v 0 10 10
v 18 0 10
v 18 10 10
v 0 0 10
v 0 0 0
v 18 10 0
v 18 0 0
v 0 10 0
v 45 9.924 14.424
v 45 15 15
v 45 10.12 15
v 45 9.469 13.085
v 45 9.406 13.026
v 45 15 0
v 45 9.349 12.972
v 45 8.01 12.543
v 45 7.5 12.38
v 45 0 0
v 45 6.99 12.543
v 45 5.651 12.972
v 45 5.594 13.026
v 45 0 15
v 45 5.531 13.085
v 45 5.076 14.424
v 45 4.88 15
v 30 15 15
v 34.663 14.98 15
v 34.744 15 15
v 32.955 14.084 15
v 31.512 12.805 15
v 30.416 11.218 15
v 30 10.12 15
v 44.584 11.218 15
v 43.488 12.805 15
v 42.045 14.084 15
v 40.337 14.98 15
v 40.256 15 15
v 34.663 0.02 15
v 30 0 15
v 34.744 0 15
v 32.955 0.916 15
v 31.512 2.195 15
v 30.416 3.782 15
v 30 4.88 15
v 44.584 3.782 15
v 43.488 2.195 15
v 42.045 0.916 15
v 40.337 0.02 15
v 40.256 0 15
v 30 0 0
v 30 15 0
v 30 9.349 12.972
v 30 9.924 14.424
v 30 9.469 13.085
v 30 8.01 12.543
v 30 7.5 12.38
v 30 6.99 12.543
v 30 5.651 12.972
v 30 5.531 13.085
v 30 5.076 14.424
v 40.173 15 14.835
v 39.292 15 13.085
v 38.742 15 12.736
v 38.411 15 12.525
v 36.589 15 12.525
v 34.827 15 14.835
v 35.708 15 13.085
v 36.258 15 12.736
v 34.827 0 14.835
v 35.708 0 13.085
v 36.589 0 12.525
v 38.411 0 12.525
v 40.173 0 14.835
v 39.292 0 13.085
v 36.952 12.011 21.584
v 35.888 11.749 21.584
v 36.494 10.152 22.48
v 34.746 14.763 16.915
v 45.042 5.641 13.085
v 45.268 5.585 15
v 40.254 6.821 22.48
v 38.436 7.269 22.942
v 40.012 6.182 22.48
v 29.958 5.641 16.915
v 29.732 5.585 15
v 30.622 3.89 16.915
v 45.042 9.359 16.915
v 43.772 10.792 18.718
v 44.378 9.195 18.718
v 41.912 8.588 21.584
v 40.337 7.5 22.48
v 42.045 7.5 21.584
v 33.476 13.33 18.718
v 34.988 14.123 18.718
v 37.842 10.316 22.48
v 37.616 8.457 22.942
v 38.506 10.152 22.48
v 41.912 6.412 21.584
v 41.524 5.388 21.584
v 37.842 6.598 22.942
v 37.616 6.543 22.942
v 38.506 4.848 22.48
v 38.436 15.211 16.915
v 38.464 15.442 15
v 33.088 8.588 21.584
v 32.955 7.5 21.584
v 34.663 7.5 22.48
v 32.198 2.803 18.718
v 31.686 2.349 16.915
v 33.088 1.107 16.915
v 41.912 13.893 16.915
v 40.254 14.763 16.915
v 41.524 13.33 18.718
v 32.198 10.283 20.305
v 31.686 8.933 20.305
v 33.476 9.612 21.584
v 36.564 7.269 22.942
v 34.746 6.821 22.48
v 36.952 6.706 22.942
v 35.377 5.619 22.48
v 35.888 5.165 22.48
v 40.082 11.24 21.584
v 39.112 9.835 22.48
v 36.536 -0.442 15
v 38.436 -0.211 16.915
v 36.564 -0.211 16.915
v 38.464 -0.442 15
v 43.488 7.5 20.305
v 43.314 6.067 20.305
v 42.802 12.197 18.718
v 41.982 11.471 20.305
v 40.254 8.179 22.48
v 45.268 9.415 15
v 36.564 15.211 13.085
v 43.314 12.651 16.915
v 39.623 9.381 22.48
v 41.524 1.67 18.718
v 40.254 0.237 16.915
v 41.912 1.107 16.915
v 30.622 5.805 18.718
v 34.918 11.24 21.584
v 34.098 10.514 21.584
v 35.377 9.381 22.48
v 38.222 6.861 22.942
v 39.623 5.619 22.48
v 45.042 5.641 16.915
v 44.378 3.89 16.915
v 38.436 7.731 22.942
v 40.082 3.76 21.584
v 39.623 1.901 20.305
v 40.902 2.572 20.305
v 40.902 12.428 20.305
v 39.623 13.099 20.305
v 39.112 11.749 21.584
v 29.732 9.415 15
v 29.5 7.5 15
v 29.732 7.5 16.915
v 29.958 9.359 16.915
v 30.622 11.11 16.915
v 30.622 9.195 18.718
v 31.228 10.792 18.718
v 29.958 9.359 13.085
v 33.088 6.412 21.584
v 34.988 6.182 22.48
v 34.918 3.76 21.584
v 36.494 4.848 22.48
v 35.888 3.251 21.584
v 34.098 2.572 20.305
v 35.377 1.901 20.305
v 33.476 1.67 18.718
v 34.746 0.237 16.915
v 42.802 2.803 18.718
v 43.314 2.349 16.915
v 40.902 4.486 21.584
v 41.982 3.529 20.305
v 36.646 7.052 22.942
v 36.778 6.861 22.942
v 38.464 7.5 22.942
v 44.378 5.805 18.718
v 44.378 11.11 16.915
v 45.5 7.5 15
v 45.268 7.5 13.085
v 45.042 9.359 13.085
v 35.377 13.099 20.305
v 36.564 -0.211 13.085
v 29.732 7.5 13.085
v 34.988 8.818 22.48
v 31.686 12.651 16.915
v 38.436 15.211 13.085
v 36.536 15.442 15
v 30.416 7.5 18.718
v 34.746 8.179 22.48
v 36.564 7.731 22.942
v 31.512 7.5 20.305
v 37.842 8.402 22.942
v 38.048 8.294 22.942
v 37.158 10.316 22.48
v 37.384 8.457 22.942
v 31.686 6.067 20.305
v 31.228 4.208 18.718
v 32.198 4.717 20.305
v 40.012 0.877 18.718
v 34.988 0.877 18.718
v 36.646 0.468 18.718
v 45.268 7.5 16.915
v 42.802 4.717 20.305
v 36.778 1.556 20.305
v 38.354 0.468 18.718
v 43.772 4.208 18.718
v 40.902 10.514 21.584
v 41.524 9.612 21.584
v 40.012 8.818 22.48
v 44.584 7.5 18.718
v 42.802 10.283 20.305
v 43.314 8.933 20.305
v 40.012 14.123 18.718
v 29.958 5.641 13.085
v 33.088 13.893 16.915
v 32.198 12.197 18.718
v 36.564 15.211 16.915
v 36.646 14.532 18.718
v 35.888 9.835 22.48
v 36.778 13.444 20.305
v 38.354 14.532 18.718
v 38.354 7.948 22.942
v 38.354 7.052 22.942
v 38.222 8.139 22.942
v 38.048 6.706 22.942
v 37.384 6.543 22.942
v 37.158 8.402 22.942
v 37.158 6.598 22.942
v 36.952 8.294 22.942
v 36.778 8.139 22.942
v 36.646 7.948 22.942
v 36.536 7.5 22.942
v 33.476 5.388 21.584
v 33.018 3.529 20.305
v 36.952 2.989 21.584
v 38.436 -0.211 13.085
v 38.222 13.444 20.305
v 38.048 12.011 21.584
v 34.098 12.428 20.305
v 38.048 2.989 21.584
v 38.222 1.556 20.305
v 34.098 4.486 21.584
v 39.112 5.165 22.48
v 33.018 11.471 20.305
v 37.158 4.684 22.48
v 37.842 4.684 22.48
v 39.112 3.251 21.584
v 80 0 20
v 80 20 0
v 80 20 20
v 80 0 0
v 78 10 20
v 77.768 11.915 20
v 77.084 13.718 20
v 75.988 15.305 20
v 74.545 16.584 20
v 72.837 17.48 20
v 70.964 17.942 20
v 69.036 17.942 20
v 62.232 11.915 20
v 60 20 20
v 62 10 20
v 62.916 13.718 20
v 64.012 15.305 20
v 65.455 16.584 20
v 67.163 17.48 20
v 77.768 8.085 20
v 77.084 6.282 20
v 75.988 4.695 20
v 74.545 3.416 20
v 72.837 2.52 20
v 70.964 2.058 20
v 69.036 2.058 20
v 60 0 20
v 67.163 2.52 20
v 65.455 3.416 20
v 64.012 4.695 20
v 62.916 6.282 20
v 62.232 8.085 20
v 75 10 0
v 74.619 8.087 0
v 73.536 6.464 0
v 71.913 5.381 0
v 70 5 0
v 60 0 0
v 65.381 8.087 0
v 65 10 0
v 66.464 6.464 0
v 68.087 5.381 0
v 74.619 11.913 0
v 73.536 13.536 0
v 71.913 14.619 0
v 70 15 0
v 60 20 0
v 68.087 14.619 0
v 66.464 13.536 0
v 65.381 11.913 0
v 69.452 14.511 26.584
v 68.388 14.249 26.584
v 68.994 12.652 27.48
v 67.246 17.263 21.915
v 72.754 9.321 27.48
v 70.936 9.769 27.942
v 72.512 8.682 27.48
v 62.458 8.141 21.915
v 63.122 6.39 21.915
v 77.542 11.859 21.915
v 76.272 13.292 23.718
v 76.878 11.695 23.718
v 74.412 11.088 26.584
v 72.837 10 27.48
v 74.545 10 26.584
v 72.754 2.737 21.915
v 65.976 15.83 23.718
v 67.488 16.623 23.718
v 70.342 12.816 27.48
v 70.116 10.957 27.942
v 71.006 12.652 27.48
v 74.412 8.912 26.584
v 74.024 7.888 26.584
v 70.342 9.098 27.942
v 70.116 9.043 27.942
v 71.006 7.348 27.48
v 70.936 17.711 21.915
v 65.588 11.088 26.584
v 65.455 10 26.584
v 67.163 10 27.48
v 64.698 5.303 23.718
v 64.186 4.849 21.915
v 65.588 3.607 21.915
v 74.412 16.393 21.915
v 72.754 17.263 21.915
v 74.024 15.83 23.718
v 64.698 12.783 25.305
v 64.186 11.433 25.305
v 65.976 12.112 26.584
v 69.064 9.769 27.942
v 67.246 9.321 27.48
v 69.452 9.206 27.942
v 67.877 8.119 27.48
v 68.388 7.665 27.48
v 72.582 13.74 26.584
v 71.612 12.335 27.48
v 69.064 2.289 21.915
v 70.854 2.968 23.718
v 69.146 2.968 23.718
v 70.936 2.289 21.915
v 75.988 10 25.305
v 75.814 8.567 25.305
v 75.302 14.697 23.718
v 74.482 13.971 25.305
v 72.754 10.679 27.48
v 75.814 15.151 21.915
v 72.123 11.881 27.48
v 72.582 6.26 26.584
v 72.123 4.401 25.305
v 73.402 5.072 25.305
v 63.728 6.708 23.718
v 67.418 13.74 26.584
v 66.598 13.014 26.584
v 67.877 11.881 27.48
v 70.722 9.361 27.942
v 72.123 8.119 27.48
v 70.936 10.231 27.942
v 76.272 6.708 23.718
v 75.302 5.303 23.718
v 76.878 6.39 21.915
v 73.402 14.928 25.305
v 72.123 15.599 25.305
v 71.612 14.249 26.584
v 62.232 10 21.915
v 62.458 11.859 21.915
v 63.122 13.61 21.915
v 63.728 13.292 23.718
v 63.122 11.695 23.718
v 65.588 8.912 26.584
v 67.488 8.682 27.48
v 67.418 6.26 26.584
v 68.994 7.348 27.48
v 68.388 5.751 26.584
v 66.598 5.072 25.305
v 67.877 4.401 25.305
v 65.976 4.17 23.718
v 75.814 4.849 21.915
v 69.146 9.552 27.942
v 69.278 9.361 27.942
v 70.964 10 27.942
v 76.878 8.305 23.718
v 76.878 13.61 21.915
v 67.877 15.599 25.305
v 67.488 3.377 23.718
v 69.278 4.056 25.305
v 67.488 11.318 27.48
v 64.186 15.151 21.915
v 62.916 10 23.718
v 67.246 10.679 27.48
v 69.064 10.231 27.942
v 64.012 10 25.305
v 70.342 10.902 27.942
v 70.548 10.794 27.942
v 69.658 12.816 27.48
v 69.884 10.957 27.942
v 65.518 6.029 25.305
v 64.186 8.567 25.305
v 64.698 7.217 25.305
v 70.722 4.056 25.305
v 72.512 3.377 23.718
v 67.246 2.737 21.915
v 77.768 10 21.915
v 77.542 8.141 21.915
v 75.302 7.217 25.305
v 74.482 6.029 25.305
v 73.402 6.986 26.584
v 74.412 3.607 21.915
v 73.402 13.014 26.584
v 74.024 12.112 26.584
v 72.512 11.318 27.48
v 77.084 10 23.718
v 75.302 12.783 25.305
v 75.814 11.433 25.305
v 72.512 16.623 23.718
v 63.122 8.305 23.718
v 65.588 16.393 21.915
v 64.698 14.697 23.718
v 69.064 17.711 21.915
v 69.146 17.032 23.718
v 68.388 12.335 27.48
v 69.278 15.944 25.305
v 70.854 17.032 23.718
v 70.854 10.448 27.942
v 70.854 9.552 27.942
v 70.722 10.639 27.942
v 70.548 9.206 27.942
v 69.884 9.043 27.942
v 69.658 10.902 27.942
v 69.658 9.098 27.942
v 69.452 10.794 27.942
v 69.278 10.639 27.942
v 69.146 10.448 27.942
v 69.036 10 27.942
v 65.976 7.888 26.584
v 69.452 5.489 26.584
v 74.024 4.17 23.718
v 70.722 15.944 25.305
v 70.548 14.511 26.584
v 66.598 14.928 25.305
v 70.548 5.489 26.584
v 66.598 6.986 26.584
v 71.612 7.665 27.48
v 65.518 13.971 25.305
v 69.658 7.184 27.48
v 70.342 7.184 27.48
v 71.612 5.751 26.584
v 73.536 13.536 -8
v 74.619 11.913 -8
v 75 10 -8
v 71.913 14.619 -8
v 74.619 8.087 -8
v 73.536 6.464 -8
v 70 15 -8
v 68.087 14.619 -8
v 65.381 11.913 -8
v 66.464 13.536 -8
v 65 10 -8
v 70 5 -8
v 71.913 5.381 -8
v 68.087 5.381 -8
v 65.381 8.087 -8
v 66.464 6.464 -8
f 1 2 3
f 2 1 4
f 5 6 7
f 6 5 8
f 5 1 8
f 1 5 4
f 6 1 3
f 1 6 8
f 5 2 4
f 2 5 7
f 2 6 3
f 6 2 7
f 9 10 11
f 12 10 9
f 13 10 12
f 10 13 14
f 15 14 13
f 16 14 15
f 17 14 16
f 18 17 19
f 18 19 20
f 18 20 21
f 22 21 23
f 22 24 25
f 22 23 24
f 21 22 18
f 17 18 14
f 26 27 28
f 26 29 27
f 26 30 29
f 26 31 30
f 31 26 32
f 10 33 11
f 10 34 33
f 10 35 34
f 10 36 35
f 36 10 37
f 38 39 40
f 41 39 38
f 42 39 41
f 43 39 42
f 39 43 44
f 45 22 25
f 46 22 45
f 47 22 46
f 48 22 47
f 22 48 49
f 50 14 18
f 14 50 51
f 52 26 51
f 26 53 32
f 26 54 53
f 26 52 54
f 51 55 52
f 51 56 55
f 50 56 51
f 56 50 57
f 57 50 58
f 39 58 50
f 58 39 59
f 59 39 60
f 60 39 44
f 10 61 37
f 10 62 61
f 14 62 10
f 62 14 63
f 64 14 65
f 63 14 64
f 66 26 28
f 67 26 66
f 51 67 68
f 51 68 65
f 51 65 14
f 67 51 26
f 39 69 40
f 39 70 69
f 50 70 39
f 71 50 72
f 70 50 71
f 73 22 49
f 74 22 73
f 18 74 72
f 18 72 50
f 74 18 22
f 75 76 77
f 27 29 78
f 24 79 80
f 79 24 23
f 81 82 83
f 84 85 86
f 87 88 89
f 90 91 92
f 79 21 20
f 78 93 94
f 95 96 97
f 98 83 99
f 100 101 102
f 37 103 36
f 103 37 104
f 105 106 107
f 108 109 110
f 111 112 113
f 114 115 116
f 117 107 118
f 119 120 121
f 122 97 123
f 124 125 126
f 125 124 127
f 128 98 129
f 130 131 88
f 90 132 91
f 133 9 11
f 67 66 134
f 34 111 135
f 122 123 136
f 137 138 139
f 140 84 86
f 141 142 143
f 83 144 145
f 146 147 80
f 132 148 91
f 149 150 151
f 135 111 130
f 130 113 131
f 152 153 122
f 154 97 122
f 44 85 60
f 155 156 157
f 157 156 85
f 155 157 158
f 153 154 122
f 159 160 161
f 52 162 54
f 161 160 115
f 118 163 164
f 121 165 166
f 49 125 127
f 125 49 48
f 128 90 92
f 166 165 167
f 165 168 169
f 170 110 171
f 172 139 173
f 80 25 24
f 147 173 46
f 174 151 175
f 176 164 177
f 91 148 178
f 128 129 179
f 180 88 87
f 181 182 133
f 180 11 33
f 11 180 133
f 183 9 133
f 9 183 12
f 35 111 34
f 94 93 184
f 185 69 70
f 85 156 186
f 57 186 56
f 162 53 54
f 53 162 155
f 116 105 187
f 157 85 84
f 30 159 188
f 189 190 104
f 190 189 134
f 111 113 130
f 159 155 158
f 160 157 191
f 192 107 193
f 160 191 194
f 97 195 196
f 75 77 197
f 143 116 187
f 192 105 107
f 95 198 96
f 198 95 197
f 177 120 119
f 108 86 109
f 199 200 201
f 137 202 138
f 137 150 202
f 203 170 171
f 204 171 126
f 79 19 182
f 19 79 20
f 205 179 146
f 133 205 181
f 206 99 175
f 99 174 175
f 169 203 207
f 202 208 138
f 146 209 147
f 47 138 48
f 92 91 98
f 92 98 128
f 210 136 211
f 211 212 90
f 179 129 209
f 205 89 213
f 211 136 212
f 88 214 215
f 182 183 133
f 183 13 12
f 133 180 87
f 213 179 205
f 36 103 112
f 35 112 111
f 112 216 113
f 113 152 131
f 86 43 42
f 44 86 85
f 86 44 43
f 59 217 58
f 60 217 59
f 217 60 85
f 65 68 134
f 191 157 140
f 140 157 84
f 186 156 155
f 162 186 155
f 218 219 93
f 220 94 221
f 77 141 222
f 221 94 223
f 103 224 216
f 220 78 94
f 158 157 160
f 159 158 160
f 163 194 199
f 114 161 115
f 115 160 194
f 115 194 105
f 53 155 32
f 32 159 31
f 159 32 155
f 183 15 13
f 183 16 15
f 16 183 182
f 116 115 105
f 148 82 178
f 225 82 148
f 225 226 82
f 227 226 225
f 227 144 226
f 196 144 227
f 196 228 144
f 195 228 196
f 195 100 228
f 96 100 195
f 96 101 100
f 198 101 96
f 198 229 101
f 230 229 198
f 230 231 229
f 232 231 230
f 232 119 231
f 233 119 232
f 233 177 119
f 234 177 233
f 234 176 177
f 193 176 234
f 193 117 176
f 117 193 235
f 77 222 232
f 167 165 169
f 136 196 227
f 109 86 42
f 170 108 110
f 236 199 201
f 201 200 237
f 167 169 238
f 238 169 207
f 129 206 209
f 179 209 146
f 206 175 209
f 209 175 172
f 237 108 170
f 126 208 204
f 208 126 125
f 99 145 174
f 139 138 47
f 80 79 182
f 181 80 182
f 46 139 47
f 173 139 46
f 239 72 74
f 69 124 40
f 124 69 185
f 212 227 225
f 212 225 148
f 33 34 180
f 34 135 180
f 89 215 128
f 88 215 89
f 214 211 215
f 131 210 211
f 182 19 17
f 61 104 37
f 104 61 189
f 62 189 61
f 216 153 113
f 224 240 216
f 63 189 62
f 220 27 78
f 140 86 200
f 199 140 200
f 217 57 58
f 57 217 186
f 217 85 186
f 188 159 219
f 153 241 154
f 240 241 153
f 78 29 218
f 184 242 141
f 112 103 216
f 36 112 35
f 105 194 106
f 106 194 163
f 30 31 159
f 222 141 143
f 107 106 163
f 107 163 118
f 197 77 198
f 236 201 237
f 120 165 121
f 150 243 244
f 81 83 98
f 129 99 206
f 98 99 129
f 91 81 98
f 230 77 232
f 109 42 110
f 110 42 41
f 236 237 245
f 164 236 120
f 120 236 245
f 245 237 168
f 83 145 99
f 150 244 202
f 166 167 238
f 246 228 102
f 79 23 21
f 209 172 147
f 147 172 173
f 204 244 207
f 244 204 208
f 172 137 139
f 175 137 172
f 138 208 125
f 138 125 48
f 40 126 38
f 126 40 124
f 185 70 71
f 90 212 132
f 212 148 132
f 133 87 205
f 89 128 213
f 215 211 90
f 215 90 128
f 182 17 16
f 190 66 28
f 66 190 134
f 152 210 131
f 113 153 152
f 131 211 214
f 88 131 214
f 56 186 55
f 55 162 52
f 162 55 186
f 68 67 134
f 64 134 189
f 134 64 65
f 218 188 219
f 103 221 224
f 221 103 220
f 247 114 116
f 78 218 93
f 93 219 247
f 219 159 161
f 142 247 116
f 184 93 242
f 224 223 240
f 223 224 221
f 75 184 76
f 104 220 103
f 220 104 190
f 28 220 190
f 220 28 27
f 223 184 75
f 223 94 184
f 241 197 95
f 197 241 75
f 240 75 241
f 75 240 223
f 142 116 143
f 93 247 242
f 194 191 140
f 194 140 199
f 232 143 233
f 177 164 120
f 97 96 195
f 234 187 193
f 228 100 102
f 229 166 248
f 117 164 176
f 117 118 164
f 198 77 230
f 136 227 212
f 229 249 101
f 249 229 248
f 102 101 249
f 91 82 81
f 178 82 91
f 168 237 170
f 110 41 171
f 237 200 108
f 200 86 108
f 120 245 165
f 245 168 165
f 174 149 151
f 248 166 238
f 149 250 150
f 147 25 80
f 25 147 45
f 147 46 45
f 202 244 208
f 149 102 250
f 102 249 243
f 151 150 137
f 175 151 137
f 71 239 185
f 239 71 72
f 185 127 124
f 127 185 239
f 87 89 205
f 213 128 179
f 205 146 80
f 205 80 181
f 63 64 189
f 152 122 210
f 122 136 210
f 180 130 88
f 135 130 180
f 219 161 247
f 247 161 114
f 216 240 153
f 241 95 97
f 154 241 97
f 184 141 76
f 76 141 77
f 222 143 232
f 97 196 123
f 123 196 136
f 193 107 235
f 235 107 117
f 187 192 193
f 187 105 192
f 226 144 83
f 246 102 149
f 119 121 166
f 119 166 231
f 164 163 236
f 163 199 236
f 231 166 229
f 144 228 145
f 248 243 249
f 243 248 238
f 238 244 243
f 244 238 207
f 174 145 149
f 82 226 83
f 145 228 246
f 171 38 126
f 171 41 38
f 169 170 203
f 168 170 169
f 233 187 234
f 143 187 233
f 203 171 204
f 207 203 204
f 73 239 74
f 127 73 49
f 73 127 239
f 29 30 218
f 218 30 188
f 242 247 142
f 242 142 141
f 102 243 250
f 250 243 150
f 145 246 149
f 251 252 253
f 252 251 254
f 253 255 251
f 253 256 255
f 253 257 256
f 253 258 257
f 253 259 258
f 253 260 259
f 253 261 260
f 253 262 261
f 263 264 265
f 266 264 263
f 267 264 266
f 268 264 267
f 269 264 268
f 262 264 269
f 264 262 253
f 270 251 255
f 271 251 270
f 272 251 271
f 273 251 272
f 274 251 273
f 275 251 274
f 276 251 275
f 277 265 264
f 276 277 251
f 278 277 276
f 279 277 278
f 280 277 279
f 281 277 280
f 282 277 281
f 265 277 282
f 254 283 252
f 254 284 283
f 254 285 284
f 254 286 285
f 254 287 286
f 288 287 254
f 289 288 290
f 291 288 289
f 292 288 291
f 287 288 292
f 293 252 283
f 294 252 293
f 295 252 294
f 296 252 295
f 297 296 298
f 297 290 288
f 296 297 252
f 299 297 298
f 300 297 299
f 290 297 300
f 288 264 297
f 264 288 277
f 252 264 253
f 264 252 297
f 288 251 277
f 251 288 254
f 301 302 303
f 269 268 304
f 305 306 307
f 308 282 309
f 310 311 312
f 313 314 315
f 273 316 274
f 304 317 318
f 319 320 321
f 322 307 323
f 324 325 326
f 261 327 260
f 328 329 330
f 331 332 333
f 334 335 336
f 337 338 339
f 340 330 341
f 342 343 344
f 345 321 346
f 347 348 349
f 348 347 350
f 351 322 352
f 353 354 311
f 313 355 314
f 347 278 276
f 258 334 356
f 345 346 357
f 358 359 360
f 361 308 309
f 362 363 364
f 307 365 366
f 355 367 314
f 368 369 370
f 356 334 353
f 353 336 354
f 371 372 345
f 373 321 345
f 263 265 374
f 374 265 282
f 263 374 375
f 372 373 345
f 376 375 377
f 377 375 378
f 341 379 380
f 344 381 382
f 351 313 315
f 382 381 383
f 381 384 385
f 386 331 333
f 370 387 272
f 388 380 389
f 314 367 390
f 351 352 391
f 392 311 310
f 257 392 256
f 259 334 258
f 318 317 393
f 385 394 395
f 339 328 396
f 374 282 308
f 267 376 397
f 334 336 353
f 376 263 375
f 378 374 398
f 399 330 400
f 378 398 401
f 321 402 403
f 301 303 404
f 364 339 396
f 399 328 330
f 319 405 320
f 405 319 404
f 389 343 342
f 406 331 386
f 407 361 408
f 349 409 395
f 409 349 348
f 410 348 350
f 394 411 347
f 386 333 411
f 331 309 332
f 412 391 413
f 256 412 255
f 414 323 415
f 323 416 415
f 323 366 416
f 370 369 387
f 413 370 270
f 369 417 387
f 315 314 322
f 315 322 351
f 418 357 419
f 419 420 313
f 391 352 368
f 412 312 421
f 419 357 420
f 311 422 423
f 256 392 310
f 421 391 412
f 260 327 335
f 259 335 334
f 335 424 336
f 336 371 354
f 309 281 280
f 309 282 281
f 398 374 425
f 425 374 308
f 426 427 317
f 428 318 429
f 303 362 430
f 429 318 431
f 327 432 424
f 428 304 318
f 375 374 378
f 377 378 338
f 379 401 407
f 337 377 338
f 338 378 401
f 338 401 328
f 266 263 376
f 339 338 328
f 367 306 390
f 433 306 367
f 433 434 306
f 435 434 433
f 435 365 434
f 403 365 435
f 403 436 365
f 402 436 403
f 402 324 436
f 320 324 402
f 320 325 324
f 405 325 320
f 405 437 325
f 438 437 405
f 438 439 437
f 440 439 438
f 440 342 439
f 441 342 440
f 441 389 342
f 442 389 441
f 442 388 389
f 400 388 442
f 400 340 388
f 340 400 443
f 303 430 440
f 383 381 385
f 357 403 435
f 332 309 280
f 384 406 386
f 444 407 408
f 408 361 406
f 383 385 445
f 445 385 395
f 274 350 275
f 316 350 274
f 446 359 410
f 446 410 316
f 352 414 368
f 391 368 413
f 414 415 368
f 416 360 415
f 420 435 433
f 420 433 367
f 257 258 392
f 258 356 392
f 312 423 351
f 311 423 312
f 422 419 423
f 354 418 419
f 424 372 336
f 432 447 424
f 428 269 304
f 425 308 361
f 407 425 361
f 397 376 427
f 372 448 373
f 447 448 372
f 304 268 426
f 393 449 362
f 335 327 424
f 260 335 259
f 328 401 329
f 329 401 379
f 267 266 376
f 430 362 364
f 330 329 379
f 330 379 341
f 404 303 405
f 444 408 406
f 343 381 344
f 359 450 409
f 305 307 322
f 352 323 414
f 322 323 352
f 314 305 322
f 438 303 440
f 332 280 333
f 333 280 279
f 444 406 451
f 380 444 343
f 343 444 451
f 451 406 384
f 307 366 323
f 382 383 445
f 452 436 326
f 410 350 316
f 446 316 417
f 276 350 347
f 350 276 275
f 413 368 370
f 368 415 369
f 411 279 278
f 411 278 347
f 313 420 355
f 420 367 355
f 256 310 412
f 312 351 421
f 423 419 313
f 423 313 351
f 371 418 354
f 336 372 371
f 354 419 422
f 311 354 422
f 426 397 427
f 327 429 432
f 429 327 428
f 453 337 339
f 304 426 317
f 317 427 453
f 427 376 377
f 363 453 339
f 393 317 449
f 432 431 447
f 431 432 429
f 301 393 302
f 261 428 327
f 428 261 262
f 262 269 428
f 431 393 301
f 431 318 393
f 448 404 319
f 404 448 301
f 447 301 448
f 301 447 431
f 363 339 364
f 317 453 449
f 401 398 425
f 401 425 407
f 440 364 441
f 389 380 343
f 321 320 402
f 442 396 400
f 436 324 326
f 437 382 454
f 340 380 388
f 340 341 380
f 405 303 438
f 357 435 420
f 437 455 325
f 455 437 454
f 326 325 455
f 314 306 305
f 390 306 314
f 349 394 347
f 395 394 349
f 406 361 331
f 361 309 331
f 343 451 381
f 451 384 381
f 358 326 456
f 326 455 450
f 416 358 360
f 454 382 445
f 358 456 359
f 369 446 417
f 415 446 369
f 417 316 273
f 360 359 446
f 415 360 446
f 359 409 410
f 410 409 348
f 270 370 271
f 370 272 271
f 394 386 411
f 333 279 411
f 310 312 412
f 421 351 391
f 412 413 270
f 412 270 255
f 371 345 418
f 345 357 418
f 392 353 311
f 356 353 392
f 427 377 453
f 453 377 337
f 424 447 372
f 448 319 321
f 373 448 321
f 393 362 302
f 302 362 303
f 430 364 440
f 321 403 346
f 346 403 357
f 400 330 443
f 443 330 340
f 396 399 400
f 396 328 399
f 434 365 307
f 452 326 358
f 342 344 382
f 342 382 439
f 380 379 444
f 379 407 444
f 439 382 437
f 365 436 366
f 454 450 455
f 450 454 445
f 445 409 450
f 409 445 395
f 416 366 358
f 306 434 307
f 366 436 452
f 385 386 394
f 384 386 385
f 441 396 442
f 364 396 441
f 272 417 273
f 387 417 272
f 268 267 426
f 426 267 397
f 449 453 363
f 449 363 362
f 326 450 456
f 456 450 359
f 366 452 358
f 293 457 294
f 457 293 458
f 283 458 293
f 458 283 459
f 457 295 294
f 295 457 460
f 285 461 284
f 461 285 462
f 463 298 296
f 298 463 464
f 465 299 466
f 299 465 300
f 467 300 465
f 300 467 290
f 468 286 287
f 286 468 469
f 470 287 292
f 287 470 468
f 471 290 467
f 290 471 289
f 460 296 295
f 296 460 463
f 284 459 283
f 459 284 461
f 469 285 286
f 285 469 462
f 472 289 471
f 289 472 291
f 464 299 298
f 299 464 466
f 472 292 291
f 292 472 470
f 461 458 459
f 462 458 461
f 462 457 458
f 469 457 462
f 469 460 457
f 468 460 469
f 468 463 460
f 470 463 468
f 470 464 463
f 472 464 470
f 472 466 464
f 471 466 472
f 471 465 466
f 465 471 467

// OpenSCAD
// Union operation tests
union() {
    union() {
        cube([10, 10, 10]);
        translate([8, 0, 0]) cube([10, 10, 10]);
    }
    
    translate([30, 0, 0]) union() {
        cube([15, 15, 15]);
        translate([7.5, 7.5, 15]) sphere(r=8);
    }
    
    translate([60, 0, 0]) union() {
        cube([20, 20, 20]);
        translate([10, 10, 20]) sphere(r=8);
        translate([10, 10, -8]) cylinder(h=8, r=5);
    }
}
